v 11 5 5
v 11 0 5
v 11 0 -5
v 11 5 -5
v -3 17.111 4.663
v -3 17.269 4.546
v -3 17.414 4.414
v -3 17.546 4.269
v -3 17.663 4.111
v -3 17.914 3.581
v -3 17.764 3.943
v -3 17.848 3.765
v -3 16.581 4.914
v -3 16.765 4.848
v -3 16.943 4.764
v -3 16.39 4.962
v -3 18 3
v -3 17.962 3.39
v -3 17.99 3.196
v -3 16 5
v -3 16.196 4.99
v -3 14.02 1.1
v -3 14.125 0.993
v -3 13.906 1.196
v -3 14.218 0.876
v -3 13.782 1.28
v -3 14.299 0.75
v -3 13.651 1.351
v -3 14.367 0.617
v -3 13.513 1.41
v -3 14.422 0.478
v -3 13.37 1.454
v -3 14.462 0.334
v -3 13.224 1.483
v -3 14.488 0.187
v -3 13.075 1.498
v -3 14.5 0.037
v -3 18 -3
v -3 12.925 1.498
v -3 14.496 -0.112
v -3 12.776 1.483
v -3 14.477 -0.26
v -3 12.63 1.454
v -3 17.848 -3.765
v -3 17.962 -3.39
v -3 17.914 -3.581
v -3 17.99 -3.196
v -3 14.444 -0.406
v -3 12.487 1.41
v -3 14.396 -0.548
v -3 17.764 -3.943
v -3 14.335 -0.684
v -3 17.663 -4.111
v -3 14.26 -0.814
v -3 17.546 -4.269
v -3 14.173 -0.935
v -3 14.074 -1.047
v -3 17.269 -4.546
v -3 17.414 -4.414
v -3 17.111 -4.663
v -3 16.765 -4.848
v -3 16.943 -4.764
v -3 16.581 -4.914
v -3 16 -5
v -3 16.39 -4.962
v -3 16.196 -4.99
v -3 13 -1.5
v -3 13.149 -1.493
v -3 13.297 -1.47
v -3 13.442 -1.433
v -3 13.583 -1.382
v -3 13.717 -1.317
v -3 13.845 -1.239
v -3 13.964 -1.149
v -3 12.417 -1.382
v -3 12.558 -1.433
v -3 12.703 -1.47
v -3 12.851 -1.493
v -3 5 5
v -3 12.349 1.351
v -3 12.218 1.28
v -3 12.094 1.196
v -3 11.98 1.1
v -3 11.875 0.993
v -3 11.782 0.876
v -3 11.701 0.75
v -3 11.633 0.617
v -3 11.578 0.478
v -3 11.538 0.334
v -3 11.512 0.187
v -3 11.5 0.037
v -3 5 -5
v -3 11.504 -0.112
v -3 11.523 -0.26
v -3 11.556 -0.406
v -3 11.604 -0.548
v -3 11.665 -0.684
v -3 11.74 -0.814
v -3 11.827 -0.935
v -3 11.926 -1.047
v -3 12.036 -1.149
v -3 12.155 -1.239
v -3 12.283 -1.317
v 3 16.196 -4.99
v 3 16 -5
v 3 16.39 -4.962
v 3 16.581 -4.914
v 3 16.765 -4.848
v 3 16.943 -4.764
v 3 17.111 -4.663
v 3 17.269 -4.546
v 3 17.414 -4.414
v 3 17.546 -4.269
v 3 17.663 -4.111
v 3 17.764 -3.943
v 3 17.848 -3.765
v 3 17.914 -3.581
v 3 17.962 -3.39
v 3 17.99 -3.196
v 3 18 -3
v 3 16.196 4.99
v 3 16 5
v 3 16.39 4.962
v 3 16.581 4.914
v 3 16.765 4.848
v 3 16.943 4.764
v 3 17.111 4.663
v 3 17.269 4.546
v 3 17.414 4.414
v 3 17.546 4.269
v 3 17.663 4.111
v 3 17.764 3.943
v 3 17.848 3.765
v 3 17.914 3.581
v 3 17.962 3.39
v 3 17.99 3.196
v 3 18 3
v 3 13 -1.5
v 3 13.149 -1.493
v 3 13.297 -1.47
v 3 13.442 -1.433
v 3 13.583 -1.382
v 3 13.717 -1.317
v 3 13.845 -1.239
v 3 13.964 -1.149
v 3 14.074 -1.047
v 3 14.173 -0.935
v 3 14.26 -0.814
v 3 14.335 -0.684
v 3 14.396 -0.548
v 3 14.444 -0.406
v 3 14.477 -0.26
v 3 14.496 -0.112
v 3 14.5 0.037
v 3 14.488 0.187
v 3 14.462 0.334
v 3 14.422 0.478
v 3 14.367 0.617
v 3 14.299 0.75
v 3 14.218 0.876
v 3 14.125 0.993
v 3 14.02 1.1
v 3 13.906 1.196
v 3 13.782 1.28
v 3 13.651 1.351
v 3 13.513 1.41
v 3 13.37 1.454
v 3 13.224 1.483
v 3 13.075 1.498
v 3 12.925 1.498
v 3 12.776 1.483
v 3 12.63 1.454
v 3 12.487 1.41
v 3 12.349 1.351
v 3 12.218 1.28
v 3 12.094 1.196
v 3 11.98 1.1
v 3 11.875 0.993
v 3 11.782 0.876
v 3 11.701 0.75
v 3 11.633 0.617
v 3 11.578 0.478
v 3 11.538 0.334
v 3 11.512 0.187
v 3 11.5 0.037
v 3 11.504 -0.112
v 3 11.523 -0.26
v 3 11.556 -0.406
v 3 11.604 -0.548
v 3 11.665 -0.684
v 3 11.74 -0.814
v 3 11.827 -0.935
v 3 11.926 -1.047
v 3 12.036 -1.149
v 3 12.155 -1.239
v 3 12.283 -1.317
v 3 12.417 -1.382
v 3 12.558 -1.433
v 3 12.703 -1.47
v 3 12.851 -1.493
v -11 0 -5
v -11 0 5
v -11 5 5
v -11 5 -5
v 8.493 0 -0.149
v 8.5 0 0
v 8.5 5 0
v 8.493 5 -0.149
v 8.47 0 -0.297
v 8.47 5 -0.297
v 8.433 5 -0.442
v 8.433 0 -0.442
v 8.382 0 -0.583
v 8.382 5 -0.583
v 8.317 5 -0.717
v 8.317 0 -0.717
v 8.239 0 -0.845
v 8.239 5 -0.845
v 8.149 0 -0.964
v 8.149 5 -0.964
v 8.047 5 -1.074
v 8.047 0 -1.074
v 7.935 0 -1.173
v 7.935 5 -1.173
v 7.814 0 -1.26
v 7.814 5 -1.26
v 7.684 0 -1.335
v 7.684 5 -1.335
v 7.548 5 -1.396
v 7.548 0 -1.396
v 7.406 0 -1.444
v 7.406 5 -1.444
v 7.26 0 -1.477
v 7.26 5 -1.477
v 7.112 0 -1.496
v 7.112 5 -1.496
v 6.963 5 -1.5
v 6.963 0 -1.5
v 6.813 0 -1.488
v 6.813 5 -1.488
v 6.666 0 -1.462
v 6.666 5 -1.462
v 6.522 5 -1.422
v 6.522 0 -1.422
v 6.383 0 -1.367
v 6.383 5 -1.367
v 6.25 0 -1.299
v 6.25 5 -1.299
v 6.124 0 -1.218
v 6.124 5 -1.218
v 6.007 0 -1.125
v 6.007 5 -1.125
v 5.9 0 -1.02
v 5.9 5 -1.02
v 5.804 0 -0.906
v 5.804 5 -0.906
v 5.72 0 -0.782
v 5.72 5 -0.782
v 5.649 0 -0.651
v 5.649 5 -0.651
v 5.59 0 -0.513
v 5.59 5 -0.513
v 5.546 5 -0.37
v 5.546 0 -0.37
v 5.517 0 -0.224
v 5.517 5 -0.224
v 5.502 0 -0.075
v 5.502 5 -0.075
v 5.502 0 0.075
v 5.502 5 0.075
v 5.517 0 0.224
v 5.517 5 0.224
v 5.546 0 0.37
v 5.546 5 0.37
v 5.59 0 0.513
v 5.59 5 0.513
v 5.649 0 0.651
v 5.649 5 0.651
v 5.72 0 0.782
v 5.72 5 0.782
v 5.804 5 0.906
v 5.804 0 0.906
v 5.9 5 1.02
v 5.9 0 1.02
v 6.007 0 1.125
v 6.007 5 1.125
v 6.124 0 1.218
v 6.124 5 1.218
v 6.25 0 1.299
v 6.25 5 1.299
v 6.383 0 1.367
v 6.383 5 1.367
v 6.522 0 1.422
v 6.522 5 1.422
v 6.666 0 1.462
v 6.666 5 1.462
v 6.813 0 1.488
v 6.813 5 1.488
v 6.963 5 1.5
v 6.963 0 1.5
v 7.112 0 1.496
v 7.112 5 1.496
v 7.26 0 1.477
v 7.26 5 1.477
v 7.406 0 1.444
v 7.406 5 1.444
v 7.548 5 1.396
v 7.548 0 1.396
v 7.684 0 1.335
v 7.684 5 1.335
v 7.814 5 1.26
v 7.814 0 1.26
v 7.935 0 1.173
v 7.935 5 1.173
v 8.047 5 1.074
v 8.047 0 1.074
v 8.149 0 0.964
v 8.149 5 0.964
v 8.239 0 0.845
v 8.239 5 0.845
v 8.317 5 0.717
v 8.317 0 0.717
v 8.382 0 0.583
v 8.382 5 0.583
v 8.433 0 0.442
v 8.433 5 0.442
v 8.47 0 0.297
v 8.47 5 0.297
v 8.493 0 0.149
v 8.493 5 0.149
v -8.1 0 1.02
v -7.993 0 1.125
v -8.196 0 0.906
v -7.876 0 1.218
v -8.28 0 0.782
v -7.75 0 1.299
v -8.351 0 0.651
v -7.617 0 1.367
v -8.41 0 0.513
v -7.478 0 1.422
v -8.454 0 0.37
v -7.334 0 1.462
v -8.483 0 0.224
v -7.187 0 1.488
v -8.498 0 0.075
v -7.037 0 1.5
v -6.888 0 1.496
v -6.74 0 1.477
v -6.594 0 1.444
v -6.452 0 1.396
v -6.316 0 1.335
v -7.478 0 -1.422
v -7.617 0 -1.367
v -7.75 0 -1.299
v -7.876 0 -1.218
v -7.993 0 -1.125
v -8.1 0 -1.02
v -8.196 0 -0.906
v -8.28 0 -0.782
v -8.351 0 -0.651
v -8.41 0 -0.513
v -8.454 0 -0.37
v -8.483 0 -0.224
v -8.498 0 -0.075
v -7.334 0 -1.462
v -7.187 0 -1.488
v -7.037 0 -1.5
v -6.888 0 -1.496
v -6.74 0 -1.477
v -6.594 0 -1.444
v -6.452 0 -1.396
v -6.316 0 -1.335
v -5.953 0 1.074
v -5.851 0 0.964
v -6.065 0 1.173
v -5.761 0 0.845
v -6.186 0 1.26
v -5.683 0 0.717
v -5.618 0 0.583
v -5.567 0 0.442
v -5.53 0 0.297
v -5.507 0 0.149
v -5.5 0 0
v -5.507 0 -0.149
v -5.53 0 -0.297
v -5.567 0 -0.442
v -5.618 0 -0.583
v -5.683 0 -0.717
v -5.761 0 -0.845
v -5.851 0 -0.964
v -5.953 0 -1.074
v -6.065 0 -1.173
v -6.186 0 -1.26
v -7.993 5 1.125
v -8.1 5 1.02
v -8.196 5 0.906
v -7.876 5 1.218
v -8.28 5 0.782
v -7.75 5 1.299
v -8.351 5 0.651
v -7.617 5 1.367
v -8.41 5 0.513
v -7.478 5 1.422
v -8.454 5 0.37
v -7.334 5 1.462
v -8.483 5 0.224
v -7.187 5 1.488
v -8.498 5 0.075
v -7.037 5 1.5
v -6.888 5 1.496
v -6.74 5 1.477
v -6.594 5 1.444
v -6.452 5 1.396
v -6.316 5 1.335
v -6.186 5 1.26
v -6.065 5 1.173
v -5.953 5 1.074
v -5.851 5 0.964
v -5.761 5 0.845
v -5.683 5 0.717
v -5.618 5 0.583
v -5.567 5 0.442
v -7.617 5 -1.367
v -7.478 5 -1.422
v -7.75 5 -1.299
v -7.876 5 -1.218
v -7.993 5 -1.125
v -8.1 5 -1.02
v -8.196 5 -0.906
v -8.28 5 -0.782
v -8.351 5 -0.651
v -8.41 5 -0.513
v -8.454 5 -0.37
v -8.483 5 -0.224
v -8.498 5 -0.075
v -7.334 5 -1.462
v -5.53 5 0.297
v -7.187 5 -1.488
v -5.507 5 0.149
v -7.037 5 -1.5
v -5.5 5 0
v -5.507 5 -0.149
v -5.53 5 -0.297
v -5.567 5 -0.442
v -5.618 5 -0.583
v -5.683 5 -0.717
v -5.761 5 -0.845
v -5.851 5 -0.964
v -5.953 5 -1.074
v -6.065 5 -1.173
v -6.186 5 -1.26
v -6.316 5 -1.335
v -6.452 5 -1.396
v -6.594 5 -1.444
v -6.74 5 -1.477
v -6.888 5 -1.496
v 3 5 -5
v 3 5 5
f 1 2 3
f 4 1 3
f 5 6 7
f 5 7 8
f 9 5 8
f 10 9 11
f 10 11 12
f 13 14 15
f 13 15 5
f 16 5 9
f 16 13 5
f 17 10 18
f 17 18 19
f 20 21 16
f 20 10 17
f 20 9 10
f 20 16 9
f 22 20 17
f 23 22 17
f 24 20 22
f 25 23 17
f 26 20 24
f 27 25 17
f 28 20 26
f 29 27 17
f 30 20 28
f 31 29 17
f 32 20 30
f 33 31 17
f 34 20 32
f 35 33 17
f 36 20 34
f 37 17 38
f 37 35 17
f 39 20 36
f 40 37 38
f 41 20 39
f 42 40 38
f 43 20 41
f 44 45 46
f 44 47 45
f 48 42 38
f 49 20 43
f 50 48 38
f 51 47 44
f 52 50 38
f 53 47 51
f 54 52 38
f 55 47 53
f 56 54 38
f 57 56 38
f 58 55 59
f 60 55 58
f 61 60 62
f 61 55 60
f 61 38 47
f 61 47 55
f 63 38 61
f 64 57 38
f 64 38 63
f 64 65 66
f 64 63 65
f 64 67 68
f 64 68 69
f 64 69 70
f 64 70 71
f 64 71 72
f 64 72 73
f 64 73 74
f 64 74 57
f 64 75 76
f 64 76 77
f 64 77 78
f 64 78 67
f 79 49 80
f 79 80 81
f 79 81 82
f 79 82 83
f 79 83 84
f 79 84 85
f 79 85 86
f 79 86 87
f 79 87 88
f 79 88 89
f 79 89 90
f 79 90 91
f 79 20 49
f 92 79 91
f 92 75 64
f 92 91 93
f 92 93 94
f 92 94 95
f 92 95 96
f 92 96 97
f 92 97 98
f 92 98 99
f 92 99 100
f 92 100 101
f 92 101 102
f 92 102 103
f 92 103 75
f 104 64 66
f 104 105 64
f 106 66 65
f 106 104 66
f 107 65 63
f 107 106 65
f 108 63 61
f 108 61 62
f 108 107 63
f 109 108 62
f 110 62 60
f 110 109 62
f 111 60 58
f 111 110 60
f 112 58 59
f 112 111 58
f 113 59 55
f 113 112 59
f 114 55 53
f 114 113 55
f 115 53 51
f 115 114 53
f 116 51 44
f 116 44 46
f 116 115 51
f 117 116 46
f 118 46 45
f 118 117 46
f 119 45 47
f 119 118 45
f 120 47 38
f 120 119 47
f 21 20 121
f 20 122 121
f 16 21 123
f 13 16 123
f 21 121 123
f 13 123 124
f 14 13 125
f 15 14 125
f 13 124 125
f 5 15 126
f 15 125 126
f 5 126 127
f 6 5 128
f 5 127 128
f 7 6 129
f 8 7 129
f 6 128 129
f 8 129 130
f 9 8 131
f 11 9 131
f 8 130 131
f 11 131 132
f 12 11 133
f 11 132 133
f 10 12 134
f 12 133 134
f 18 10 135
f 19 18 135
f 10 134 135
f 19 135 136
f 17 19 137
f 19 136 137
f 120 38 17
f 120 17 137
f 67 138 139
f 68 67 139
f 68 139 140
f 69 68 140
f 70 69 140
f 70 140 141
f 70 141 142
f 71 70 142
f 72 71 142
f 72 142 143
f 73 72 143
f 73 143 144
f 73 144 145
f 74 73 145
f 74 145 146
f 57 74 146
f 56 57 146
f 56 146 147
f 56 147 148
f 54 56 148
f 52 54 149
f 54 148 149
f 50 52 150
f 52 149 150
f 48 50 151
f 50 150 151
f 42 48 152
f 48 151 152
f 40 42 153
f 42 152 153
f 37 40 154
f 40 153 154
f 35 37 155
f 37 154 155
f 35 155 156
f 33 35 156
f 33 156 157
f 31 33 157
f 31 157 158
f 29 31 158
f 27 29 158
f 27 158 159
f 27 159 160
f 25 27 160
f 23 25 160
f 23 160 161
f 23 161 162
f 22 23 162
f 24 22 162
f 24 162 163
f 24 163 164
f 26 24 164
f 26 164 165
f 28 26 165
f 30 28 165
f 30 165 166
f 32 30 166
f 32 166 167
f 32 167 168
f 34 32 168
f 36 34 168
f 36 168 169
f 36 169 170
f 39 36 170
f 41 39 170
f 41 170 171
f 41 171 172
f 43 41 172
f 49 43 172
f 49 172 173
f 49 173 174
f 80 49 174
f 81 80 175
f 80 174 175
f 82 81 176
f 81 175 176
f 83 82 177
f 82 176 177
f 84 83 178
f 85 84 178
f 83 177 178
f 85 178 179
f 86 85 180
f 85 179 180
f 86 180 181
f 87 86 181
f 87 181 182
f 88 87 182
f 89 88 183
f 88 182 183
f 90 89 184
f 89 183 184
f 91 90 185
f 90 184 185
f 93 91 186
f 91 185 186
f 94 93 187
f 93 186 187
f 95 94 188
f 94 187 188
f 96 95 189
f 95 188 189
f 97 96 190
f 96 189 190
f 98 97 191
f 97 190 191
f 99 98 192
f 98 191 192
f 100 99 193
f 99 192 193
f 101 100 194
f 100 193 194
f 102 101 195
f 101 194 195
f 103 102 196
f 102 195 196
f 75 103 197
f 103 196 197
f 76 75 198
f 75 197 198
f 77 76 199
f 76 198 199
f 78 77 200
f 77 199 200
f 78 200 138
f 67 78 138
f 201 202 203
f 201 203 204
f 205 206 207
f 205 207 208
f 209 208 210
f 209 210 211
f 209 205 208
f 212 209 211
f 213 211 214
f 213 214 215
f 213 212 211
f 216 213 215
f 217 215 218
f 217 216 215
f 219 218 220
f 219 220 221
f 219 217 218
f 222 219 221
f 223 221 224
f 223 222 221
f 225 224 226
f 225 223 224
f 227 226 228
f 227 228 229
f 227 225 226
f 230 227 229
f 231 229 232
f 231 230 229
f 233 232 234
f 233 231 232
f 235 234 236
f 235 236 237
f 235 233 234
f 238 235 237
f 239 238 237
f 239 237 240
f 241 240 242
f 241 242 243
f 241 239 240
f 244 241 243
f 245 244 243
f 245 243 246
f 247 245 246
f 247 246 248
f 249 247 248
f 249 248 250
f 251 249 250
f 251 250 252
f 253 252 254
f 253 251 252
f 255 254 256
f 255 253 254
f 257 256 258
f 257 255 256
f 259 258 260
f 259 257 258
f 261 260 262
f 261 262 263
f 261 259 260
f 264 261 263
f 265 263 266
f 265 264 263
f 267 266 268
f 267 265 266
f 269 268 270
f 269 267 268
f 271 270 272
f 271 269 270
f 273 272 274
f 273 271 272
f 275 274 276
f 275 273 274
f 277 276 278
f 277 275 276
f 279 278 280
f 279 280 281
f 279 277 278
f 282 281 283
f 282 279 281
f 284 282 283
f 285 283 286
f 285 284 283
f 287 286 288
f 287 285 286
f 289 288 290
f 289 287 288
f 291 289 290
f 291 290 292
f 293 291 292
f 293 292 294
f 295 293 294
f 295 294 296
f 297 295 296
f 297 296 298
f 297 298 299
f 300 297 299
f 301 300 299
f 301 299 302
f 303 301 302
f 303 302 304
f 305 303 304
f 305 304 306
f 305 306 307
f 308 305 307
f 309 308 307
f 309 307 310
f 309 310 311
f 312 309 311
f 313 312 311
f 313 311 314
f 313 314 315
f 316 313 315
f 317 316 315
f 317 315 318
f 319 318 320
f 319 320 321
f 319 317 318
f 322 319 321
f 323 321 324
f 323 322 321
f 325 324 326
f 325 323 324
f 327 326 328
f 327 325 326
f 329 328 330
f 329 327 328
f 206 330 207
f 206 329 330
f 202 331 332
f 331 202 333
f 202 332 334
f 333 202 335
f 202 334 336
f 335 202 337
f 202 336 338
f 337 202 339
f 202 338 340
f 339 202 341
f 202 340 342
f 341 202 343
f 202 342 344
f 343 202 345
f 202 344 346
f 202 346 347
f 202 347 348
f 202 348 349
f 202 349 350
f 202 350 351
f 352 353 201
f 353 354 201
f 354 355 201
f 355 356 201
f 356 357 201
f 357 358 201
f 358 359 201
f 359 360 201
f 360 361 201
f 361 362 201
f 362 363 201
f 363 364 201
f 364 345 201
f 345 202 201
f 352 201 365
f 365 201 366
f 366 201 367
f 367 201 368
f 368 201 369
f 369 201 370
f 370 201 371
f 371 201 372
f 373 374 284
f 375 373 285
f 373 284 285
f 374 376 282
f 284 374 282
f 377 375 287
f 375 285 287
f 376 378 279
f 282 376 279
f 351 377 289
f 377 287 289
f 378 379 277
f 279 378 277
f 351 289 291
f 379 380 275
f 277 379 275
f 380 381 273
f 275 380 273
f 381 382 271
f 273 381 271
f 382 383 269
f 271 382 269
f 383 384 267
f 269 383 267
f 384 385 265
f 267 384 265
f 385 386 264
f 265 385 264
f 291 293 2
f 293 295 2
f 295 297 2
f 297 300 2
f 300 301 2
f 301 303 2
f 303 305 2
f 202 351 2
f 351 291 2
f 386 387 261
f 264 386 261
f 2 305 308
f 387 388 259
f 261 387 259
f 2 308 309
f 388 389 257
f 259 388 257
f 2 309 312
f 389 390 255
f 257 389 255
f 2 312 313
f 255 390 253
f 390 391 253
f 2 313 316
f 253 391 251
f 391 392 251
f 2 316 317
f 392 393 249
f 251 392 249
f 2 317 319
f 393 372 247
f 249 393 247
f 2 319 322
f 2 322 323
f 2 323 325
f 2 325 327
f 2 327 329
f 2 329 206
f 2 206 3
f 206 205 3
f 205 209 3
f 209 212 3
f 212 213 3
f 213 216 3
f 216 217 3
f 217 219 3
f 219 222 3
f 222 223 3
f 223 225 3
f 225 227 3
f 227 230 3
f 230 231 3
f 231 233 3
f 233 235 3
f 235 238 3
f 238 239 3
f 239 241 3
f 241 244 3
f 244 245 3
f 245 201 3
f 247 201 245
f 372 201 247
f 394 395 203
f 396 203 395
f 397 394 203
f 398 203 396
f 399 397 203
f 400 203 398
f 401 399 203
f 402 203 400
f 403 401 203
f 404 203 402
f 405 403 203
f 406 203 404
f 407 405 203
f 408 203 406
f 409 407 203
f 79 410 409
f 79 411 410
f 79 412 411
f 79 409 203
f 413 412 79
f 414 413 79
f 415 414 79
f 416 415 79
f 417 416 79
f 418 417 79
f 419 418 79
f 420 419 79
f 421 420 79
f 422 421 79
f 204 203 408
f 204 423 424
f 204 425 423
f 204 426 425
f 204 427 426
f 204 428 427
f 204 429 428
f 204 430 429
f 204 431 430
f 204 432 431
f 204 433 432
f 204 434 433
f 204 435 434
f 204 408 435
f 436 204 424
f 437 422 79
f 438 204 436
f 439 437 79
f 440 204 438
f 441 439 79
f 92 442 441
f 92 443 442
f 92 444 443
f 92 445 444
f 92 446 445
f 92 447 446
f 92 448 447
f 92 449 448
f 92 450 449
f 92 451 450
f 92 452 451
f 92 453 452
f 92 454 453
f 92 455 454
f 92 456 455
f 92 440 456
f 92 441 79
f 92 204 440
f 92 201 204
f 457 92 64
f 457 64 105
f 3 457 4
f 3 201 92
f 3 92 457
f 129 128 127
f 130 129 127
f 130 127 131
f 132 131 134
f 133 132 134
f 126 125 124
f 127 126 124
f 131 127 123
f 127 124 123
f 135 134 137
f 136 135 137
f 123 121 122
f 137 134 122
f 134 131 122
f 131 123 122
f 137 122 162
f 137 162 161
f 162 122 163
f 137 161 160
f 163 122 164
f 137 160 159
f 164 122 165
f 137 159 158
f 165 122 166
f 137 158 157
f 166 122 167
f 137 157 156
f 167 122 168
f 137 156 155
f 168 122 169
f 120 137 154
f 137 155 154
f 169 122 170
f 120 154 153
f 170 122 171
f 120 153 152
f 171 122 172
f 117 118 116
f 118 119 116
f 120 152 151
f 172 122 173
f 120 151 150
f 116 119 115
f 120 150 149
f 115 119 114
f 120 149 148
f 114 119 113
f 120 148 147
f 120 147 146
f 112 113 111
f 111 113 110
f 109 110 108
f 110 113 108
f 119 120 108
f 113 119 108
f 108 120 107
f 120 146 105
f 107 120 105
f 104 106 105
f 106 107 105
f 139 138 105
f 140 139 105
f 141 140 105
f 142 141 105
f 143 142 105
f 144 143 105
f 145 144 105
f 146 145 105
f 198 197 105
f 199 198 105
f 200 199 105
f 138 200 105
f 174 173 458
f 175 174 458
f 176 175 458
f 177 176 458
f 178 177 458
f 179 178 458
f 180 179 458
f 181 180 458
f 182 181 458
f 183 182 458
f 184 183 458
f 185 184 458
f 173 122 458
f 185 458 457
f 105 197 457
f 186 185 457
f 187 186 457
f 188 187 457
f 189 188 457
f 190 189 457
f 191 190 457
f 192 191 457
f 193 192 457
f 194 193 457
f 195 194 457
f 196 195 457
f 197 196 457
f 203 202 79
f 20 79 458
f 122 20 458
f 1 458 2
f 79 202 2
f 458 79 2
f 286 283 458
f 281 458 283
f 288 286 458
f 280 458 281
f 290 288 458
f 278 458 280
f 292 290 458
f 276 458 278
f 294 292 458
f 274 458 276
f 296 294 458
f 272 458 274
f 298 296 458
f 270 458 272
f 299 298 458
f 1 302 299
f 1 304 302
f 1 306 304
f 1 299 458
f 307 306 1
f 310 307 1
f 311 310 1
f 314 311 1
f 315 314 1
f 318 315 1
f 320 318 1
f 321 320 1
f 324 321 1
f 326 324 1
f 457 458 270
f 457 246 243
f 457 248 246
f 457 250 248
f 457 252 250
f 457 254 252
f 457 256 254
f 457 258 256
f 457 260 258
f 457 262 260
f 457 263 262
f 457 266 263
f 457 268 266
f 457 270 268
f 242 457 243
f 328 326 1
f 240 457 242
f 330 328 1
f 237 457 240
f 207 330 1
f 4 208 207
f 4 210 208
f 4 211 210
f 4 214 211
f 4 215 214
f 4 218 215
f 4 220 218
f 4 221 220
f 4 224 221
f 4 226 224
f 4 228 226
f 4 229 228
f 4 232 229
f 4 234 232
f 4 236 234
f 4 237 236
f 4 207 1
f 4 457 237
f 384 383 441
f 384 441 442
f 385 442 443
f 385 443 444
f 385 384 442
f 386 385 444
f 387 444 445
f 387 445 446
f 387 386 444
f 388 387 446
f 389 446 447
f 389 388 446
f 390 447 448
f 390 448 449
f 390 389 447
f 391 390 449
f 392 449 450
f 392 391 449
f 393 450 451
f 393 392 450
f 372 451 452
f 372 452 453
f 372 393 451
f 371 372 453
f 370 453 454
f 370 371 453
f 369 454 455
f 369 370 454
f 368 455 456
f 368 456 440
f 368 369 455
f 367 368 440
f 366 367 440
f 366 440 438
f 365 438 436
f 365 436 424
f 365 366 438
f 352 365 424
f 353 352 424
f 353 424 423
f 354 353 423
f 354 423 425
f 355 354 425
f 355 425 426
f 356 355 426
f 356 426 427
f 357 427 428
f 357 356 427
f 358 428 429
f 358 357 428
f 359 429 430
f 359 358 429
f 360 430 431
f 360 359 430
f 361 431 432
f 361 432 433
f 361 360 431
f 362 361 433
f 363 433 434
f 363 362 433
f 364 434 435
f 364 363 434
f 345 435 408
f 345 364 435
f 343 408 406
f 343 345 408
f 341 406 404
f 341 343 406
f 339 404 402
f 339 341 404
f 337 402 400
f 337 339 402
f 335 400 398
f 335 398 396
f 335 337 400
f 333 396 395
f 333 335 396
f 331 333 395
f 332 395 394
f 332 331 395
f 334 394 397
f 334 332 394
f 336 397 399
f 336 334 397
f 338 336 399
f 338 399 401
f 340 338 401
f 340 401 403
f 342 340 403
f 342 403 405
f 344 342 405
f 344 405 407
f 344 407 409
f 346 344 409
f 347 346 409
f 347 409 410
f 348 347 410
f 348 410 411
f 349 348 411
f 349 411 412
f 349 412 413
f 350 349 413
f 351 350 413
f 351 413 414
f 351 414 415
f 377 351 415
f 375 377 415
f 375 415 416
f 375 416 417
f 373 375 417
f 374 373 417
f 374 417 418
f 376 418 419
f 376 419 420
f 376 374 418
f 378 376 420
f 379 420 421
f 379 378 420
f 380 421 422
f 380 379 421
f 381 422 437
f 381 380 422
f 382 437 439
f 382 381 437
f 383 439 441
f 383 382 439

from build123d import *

# Parameters (mm, degrees)
SKETCH1_W           = 22
SKETCH1_H           = 10
SKETCH1_R           = 1.5
BOSS_EXTRUDE1_DEPTH = 5
SKETCH4_W           = 6
SKETCH4_H           = 10
BOSS_EXTRUDE3_DEPTH = 13
CUT_EXTRUDE1_REACH  = 16
SKETCH5_R           = 1.5
FILLET1_R           = 2


with BuildPart() as part:
    # Sketch1 → Boss-Extrude1 (new body)
    with BuildSketch(Plane(origin=(0, 0, 0), x_dir=(1, 0, 0), z_dir=(0, 1, 0))):
        Rectangle(SKETCH1_W, SKETCH1_H)
        with Locations((-7, 0)):
            Circle(SKETCH1_R, mode=Mode.SUBTRACT)
        with Locations((7, 0)):
            Circle(SKETCH1_R, mode=Mode.SUBTRACT)
    extrude(amount=BOSS_EXTRUDE1_DEPTH)

    # Sketch4 → Boss-Extrude3 (add)
    with BuildSketch(Plane(origin=(0, 5, 0), x_dir=(1, 0, 0), z_dir=(0, 1, 0))):
        Rectangle(SKETCH4_W, SKETCH4_H)
    extrude(amount=BOSS_EXTRUDE3_DEPTH)

    # Sketch5 → Cut-Extrude1 (cut, up to next)
    with BuildSketch(Plane(origin=(3, 0, 0), x_dir=(0, 0, -1), z_dir=(1, 0, 0)), mode=Mode.PRIVATE) as cut_extrude1_sk1:
        with Locations((0, 13)):
            Circle(SKETCH5_R)
    cut_extrude1_tool1 = extrude(cut_extrude1_sk1.sketch, amount=-CUT_EXTRUDE1_REACH, mode=Mode.PRIVATE) & part.part
    add(cut_extrude1_tool1.solids().sort_by_distance((3, 13, 0))[0], mode=Mode.SUBTRACT)

    # Fillet1
    fillet1_edges = [part.edges().sort_by_distance(p)[0] for p in [
        (0, 18, -5),
        (0, 18, 5),
    ]]
    fillet(fillet1_edges, radius=FILLET1_R)


solid = part.part
